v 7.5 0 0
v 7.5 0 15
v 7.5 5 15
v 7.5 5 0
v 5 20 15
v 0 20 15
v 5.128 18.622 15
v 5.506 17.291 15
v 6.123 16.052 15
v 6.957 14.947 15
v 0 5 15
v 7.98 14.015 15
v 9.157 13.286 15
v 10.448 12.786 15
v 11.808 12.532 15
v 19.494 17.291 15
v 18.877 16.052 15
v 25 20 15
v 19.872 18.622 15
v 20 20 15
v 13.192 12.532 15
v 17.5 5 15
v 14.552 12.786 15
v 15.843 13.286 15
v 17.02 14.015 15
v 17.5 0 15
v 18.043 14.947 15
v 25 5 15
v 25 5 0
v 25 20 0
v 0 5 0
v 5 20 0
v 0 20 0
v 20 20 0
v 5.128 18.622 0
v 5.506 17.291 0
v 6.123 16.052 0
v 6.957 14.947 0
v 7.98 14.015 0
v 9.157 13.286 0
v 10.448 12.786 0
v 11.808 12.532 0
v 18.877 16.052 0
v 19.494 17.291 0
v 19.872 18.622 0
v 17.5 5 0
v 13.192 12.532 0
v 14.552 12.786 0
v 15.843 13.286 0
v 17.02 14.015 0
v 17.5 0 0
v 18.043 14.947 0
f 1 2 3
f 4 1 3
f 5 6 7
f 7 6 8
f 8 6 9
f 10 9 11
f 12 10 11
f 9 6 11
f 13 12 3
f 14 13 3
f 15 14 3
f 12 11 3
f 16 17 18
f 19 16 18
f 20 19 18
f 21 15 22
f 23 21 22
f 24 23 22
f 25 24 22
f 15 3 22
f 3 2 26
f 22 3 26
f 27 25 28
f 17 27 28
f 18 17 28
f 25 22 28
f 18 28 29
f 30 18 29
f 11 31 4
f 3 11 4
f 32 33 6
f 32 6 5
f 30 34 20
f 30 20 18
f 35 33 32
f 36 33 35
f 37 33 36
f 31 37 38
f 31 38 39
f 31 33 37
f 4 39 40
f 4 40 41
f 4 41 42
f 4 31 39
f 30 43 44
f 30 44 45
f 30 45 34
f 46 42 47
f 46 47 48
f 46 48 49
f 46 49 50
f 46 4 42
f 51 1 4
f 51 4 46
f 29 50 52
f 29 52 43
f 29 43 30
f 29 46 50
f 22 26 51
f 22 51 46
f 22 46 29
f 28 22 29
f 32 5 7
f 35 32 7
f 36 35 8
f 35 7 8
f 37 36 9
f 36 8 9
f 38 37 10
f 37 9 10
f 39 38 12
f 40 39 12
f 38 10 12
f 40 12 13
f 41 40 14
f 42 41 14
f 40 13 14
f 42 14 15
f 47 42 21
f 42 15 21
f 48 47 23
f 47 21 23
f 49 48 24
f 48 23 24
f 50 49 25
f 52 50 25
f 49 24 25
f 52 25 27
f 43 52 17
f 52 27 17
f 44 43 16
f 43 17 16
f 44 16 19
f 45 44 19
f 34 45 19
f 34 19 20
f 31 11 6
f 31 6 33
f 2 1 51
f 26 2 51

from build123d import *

# Parameters (mm, degrees)
CROQUIS1_W              = 25
CROQUIS1_H              = 15
SALIENTE_EXTRUIR1_DEPTH = 20
CROQUIS2_W              = 7.5
CROQUIS2_H              = 5
CORTAR_EXTRUIR1_DEPTH   = 20
CROQUIS3_R              = 7.5
CORTAR_EXTRUIR2_DEPTH   = 20


with BuildPart() as part:
    # Croquis1 → Saliente-Extruir1 (new body)
    with BuildSketch(Plane(origin=(0, 0, 0), x_dir=(1, 0, 0), z_dir=(0, 1, 0))):
        with Locations((12.5, -7.5)):
            Rectangle(CROQUIS1_W, CROQUIS1_H)
    extrude(amount=SALIENTE_EXTRUIR1_DEPTH)

    # Croquis2 → Cortar-Extruir1 (cut)
    with BuildSketch(Plane.XY.offset(15)):
        with Locations((21.25, 2.5)):
            Rectangle(CROQUIS2_W, CROQUIS2_H)
        with Locations((3.75, 2.5)):
            Rectangle(CROQUIS2_W, CROQUIS2_H)
    extrude(amount=-CORTAR_EXTRUIR1_DEPTH, mode=Mode.SUBTRACT)

    # Croquis3 → Cortar-Extruir2 (cut)
    with BuildSketch(Plane.XY.offset(15)):
        with Locations((12.5, 20)):
            Circle(CROQUIS3_R)
    extrude(amount=-CORTAR_EXTRUIR2_DEPTH, mode=Mode.SUBTRACT)


solid = part.part
